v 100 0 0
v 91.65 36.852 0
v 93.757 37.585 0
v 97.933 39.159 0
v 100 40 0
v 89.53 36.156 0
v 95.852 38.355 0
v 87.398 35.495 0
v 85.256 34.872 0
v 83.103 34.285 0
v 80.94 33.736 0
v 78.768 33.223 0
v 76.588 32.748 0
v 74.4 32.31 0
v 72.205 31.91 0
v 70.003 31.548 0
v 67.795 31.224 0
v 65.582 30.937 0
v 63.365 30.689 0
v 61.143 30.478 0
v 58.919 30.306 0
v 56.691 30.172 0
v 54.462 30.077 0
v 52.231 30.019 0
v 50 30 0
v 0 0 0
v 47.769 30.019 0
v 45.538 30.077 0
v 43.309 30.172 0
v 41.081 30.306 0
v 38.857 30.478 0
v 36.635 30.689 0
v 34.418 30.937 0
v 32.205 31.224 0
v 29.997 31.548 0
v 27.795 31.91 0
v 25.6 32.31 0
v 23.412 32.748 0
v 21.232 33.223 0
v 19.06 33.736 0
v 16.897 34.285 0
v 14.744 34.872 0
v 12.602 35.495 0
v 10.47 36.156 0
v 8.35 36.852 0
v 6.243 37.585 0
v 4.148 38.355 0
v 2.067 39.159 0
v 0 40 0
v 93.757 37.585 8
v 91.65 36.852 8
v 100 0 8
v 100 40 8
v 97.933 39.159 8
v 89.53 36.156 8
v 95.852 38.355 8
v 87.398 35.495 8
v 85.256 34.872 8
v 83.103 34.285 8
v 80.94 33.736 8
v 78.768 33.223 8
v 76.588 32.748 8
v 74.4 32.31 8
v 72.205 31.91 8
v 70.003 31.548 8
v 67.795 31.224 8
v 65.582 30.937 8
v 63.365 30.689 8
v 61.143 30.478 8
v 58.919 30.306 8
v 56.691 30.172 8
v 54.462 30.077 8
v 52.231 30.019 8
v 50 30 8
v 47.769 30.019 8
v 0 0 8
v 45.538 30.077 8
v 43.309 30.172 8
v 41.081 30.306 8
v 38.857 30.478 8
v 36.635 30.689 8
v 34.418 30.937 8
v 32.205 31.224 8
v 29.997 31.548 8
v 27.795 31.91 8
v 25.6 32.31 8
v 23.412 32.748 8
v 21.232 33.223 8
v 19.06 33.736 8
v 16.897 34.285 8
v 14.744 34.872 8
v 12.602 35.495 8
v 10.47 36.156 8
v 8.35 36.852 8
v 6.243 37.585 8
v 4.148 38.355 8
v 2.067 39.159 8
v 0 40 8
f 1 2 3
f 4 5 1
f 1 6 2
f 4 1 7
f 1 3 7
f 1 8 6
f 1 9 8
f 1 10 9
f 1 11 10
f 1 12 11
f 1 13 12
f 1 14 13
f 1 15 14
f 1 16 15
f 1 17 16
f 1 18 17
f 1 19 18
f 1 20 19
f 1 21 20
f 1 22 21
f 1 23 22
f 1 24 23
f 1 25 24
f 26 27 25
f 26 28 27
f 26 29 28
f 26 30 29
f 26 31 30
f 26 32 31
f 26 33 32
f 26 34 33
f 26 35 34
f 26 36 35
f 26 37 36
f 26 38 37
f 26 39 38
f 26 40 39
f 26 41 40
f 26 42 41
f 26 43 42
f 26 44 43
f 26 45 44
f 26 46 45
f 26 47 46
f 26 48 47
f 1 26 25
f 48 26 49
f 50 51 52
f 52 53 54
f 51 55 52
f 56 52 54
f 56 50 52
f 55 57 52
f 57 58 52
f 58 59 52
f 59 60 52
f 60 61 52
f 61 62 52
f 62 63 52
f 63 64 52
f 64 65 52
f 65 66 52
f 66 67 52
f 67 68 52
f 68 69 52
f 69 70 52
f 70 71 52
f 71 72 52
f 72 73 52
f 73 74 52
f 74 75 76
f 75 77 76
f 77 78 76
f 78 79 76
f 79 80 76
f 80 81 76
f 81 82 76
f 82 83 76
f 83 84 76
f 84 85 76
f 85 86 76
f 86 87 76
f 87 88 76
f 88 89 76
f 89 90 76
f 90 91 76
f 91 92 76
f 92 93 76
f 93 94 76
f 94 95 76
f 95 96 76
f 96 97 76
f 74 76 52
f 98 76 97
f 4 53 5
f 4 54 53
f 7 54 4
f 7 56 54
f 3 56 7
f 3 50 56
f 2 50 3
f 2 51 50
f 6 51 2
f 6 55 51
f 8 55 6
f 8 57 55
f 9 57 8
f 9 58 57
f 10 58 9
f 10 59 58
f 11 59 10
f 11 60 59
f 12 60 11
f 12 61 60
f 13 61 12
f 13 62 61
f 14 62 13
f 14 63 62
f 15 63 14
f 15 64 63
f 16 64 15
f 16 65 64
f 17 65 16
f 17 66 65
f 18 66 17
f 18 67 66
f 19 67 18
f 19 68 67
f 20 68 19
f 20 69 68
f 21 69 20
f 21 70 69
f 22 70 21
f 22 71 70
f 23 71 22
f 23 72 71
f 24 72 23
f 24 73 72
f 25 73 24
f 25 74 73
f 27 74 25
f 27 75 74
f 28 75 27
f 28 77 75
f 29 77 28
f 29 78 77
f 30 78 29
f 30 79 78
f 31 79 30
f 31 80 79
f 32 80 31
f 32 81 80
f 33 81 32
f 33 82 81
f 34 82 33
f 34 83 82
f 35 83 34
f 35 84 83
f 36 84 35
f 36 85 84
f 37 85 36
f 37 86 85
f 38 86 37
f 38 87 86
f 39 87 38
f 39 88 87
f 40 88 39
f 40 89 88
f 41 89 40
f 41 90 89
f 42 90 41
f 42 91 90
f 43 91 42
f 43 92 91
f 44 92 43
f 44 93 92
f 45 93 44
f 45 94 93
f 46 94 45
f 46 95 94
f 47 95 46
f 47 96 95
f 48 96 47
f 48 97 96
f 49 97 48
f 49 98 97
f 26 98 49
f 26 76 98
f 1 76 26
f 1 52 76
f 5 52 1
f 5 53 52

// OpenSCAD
$fn = 32;

// ----------------------------------------------------------------------
// Arc profile plate: notch, 49 points
// ----------------------------------------------------------------------

// --- parameters (mm) ---
bar_l = 100;              // bar length, X
bar_w = 40;               // bar width, Y
notch_depth = 10;         // depth of the arc notch at mid-span
arc_r = 130;              // radius of the notch arc
arc_angle = 45.24;        // notch arc angle, degrees
arc_step = 1;             // sampling step of the notch arc, degrees
plate_t = 8;              // plate thickness, Z

profile = [[0, 0], [100, 0], [100, 40], [97.933, 39.159], [95.852, 38.355], [93.757, 37.585], [91.65, 36.852], [89.53, 36.156], [87.398, 35.495], [85.256, 34.872], [83.103, 34.285], [80.94, 33.736], [78.768, 33.223], [76.588, 32.748], [74.4, 32.31], [72.205, 31.91], [70.003, 31.548], [67.795, 31.224], [65.582, 30.937], [63.365, 30.689], [61.143, 30.478], [58.919, 30.306], [56.691, 30.172], [54.462, 30.077], [52.231, 30.019], [50, 30], [47.769, 30.019], [45.538, 30.077], [43.309, 30.172], [41.081, 30.306], [38.857, 30.478], [36.635, 30.689], [34.418, 30.937], [32.205, 31.224], [29.997, 31.548], [27.795, 31.91], [25.6, 32.31], [23.412, 32.748], [21.232, 33.223], [19.06, 33.736], [16.897, 34.285], [14.744, 34.872], [12.602, 35.495], [10.47, 36.156], [8.35, 36.852], [6.243, 37.585], [4.148, 38.355], [2.067, 39.159], [0, 40]];  // primary outline, 49 points, counter clockwise

// --- the one profile operation ---
linear_extrude(height = plate_t) polygon(points = profile);
